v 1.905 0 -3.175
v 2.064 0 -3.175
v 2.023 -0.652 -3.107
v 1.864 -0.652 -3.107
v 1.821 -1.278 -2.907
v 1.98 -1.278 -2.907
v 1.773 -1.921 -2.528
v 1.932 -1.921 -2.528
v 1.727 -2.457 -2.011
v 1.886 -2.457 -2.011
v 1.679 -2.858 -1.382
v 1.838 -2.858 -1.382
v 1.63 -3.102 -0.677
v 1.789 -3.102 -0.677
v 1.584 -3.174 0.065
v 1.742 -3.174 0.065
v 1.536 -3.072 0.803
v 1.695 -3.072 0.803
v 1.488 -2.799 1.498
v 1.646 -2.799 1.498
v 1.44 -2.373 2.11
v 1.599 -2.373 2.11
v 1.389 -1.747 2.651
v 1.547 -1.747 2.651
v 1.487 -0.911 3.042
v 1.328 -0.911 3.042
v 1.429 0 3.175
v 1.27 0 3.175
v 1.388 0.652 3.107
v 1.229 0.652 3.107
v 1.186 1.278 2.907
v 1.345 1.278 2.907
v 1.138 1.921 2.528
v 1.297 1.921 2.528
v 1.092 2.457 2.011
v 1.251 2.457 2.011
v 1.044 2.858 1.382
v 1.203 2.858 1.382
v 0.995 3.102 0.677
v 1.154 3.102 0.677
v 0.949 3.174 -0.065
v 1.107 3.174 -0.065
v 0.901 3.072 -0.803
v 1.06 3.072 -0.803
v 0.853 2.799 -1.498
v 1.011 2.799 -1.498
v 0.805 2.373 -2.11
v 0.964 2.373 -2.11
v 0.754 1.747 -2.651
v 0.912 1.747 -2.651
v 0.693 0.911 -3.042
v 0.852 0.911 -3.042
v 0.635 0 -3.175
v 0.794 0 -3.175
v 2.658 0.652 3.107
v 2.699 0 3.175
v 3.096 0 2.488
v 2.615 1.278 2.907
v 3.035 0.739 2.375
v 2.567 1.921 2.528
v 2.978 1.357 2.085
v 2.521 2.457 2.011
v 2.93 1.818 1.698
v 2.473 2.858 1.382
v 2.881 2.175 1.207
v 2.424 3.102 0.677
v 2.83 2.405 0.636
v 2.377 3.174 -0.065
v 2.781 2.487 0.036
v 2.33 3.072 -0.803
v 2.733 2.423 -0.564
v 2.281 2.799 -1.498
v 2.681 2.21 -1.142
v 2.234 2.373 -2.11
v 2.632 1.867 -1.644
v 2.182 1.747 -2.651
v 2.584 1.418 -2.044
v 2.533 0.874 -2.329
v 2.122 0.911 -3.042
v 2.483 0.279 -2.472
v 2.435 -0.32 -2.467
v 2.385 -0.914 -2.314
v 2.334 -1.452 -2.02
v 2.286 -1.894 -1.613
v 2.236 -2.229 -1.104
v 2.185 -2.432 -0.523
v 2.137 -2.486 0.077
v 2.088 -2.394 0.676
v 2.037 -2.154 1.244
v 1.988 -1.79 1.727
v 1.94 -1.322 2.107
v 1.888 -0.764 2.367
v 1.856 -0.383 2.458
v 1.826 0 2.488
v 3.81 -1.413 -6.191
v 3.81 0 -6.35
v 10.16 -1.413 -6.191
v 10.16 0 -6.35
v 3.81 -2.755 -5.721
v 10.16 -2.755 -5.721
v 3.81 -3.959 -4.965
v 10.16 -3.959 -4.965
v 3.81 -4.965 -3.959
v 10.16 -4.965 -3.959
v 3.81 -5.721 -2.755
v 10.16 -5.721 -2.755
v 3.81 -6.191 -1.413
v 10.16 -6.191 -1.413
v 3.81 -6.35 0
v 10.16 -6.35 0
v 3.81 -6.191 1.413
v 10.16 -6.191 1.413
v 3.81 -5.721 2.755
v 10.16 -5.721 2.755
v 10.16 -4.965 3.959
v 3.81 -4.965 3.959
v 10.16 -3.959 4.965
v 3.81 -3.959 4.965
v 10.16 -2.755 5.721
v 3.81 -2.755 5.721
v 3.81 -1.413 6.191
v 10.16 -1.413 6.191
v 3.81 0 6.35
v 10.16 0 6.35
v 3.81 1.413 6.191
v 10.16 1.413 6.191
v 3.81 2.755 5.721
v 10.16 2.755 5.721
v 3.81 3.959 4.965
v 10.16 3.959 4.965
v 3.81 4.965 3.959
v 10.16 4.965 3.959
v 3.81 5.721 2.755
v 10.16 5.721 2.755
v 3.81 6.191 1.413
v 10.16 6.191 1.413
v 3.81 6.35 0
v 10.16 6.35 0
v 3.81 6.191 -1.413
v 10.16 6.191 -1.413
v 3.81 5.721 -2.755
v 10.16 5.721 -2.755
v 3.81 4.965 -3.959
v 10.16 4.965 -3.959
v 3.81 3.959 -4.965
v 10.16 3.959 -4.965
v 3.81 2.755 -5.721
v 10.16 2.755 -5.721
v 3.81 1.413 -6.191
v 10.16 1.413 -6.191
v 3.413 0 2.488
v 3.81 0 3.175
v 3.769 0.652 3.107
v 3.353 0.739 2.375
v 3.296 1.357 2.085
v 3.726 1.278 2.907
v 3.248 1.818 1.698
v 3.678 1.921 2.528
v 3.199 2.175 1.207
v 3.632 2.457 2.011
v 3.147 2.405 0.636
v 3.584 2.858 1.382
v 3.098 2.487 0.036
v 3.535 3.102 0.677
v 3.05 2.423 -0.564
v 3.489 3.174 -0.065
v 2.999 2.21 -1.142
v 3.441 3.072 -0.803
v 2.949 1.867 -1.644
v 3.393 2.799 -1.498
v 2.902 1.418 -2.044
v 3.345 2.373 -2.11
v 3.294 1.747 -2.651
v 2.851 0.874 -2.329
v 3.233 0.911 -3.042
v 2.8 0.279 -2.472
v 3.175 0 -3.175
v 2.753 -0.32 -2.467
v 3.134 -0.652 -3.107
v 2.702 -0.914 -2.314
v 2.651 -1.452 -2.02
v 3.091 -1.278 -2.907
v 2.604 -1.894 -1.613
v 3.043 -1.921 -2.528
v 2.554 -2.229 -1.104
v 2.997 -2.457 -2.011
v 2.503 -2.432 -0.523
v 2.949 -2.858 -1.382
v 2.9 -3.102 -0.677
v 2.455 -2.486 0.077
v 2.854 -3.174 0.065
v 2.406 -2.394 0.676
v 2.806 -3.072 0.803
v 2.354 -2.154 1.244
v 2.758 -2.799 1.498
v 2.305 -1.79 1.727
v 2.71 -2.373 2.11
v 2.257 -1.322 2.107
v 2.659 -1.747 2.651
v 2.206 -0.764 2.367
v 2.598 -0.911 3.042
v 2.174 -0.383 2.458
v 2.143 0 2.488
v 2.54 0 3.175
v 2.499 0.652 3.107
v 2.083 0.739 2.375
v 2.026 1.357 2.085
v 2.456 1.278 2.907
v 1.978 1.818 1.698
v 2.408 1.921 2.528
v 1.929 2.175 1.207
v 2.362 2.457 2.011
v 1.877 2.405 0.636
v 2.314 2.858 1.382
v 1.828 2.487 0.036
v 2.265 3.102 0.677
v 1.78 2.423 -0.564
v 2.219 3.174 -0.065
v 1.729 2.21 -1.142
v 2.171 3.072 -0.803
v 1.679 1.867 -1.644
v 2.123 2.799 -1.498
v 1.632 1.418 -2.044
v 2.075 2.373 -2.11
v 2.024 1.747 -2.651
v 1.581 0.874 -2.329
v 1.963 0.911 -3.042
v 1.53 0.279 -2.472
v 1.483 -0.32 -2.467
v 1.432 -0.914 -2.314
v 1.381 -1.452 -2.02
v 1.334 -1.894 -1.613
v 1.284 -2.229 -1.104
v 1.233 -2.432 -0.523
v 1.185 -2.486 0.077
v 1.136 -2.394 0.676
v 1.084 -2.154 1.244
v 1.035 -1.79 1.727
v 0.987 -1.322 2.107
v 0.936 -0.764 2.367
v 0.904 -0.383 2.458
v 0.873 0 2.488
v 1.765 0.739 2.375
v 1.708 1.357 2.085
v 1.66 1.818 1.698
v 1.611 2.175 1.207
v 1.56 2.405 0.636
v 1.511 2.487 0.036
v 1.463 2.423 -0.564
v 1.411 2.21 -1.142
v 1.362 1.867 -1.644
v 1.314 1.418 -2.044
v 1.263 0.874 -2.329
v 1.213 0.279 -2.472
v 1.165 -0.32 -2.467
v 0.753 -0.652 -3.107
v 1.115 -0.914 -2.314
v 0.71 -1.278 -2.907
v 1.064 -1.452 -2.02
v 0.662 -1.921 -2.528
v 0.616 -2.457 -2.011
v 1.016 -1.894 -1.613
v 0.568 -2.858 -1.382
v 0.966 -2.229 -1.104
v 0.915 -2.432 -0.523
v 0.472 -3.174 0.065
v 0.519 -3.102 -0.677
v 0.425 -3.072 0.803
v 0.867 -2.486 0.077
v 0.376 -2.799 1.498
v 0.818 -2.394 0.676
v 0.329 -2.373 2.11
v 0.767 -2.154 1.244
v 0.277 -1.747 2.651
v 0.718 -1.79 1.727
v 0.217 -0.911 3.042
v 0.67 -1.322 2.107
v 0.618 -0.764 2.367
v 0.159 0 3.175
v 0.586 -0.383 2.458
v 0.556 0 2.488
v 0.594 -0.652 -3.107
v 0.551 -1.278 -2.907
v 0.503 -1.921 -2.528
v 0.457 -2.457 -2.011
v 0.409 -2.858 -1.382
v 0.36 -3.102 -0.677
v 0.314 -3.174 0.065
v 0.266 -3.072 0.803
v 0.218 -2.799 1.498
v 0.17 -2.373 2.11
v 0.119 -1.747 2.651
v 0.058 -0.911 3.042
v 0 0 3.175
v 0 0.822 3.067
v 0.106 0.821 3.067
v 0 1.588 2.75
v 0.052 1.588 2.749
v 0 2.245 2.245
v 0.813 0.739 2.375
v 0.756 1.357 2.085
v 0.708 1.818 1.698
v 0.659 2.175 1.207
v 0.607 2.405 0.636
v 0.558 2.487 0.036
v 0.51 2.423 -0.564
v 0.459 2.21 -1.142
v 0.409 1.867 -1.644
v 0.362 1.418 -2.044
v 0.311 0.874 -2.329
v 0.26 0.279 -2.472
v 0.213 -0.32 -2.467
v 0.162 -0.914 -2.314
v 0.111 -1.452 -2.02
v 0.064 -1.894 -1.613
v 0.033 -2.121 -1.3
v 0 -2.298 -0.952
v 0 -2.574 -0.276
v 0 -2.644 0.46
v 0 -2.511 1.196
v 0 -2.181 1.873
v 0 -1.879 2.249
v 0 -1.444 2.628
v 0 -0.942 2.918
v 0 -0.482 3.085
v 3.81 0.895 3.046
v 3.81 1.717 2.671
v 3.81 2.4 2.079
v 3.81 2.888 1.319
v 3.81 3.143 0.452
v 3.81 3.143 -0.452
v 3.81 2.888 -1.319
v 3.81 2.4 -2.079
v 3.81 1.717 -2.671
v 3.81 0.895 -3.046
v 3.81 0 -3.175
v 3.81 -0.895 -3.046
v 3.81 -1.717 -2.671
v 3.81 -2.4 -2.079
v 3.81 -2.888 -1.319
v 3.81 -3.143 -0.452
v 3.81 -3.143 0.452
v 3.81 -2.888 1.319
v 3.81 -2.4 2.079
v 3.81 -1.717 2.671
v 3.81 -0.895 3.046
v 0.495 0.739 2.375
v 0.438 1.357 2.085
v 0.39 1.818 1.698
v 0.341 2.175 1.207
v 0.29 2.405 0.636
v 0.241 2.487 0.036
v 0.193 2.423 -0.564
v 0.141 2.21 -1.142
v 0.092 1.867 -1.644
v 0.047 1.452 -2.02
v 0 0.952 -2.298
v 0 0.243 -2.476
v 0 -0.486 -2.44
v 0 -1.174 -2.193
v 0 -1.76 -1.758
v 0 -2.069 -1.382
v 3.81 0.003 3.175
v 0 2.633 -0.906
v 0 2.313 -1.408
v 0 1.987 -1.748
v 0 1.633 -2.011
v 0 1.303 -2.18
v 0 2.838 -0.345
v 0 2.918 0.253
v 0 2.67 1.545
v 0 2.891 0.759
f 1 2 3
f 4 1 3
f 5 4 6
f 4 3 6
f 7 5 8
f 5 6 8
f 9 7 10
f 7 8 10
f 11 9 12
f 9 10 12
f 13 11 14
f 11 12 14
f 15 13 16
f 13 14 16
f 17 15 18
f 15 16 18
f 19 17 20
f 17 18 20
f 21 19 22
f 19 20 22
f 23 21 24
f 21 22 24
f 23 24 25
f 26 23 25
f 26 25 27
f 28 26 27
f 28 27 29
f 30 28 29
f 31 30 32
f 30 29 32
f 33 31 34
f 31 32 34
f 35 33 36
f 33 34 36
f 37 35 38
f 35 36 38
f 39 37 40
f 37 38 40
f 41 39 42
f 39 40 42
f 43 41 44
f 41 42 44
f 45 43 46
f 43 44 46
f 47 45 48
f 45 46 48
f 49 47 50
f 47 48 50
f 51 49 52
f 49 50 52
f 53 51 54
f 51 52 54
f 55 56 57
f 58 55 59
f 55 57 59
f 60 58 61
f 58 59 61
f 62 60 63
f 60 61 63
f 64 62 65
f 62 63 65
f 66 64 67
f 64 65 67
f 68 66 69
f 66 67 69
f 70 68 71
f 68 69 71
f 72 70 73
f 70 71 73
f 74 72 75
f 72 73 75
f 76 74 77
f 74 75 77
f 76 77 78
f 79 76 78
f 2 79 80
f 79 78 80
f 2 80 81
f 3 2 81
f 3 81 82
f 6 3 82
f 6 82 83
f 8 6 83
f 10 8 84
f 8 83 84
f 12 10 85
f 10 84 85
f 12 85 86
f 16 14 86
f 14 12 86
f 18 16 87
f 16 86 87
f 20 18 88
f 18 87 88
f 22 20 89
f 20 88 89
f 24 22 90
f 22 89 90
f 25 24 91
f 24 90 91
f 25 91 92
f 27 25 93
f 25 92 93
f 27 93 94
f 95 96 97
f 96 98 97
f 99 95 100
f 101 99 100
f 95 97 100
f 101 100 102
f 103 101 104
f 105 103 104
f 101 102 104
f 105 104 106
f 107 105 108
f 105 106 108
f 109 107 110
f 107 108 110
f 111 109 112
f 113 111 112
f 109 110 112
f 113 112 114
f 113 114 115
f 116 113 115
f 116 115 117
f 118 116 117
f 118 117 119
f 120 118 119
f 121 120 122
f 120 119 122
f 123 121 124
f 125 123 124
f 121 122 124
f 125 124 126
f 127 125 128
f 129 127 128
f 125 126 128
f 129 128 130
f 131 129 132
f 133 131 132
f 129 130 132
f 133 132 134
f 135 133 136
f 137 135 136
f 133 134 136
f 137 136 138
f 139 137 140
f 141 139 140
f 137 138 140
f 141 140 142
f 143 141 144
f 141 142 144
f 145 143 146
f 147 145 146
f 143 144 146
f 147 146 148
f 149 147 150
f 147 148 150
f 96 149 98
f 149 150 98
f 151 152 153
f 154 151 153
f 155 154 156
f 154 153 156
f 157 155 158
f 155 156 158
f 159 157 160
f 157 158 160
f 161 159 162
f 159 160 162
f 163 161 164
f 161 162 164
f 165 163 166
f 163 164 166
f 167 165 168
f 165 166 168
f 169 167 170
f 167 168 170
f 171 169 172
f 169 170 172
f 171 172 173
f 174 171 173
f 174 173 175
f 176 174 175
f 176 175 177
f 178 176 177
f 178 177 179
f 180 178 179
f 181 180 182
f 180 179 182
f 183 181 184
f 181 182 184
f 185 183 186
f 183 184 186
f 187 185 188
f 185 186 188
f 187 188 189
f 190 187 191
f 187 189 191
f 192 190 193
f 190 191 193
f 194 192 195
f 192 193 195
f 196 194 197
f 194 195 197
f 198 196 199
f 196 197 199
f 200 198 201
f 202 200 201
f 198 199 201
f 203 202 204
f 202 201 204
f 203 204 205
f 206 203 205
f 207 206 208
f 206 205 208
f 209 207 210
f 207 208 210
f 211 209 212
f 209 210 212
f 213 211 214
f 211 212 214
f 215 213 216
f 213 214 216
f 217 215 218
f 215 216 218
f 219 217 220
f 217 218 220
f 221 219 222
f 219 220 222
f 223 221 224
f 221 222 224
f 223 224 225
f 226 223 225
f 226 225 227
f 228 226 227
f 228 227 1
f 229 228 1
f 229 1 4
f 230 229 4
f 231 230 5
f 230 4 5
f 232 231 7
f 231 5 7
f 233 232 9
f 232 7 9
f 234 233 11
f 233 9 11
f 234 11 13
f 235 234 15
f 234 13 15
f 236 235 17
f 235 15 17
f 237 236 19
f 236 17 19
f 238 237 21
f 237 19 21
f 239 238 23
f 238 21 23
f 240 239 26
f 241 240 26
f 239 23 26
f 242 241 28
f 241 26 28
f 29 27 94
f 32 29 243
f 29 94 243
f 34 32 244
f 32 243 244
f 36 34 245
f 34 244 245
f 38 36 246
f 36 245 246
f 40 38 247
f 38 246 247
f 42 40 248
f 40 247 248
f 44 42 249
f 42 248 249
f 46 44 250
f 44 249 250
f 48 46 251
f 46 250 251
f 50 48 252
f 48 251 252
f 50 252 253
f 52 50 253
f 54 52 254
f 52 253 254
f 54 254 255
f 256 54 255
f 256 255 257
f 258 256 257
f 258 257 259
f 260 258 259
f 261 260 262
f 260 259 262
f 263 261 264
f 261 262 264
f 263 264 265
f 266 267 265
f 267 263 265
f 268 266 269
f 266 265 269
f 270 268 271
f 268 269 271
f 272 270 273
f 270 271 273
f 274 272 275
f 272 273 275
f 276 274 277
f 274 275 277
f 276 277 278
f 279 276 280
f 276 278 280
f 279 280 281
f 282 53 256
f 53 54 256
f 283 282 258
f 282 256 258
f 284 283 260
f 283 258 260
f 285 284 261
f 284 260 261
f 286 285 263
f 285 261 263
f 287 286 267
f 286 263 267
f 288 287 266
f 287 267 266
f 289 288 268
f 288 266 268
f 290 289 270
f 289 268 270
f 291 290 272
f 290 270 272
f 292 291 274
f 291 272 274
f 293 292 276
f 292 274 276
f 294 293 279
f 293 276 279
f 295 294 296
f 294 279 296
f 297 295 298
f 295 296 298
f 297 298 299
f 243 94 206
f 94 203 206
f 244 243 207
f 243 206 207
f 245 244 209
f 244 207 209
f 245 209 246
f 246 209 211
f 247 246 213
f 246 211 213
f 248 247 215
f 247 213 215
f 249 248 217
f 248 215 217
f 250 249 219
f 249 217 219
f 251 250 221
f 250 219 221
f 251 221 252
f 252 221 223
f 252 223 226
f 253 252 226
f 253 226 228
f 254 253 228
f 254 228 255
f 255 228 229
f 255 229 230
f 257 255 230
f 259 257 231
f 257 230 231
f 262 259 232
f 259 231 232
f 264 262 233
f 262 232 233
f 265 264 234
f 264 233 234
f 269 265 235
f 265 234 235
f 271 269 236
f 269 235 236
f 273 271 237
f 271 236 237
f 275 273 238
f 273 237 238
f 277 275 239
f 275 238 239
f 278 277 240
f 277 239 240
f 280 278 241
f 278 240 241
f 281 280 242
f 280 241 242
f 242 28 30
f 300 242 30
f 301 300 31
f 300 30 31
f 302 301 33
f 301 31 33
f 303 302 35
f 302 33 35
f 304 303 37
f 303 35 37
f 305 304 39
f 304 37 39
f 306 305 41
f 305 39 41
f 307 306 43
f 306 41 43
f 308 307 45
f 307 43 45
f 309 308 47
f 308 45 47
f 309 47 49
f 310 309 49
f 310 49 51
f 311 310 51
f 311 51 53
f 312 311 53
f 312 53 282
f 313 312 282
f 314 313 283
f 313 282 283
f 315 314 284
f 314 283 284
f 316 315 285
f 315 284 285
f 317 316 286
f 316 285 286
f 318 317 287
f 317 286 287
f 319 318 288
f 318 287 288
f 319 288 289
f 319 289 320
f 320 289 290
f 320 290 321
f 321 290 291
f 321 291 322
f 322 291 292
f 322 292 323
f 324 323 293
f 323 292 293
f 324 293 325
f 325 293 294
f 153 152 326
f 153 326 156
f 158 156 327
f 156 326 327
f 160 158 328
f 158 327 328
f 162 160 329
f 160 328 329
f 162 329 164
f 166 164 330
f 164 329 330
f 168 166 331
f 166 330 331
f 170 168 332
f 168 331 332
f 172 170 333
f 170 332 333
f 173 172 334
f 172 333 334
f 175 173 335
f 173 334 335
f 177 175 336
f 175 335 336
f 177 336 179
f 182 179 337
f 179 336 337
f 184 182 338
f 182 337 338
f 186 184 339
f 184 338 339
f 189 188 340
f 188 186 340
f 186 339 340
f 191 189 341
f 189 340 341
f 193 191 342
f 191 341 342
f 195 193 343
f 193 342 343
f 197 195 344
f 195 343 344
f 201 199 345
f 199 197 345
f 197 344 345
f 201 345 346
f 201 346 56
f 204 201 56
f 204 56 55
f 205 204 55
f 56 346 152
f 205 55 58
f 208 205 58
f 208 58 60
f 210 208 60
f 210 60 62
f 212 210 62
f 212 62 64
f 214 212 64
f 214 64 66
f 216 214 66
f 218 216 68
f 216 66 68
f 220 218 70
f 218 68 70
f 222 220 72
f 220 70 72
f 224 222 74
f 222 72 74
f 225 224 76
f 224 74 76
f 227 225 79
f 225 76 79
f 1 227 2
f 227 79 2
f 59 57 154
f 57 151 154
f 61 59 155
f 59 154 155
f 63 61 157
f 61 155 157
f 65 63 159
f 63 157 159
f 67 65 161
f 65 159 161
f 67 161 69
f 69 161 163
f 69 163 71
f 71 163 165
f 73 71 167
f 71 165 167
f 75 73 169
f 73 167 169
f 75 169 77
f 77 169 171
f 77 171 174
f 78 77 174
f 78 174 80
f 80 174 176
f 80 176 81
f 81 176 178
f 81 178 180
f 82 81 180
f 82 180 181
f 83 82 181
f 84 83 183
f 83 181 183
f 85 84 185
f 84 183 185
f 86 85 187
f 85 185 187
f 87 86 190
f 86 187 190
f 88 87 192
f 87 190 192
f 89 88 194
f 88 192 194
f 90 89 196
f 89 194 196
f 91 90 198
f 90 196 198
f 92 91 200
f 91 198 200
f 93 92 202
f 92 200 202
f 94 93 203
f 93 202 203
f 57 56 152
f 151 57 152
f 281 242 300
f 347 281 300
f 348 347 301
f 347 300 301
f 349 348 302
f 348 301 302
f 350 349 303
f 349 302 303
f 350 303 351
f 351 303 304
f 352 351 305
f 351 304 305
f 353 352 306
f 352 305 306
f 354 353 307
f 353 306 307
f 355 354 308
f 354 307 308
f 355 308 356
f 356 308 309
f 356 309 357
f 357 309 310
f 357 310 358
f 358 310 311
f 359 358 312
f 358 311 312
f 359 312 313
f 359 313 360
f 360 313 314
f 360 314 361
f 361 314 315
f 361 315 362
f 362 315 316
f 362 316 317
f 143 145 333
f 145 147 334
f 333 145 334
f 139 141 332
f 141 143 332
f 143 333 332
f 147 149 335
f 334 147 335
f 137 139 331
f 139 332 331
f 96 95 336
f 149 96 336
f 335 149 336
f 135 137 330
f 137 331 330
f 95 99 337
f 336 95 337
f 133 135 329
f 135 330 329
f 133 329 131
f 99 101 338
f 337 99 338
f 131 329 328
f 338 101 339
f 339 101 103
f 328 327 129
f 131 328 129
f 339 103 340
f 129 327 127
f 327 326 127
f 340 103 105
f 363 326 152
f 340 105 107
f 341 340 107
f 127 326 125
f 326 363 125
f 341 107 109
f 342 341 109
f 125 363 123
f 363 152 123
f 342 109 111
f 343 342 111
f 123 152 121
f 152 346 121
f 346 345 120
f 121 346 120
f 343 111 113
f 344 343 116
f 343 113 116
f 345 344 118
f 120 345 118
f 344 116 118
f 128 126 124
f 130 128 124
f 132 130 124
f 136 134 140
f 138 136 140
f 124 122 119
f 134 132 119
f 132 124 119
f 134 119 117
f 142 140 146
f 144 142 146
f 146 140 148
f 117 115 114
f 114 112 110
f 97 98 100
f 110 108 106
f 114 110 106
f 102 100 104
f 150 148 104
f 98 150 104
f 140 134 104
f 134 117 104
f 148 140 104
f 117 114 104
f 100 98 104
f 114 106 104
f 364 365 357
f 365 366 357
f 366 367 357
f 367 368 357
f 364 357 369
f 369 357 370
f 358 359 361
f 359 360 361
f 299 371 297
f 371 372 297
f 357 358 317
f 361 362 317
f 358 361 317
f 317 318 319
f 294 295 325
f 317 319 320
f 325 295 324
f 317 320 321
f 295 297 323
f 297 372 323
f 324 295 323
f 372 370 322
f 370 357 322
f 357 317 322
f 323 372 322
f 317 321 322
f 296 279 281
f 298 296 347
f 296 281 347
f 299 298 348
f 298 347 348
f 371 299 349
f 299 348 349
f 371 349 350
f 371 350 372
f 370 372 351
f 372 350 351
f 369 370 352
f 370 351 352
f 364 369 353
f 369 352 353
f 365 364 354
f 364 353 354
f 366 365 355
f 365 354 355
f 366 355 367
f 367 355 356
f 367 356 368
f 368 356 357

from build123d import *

# Parameters (mm, degrees)
THREAD1_PITCH = 1.27


with BuildPart() as part:
    # Sketch1 → Revolve1 (revolve)
    with BuildSketch(Plane.XY, mode=Mode.PRIVATE) as revolve1_sk:
        Polygon((0, 0), (0, 3.175), (3.81, 3.175), (3.81, 6.35), (10.16, 6.35), (10.16, 0), align=None)
    revolve(revolve1_sk.sketch.rotate(Axis((10.16, 0, 0), (-1, 0, 0)), 90), axis=Axis((10.16, 0, 0), (-1, 0, 0)))

    # Thread1: the profile of Thread Profile1 profile screwed along a right-hand helix of 3 turns, 8 arcs to a turn; built about Z, then put on its axis
    thread1_z = Axis((0, 0, 0), (0, 0, 1))
    thread1_corners = [(3.1753, 0, -0.000173205), (3.1753, 0, 1.111423202), (2.487592339, 0, 0.714374998), (2.487592339, 0, 0.396874998)]
    with BuildLine(mode=Mode.PRIVATE) as thread1_profile:
        Line(thread1_corners[0], thread1_corners[1])
        Line(thread1_corners[1], thread1_corners[2])
        Line(thread1_corners[2], thread1_corners[3])
        Line(thread1_corners[3], thread1_corners[0])
    thread1_cap = Face(thread1_profile.wire())
    thread1_turn_angles = [0, 22.5, 45, 67.5, 90, 112.5, 135, 157.5, 180, 202.5, 225, 247.5, 270, 292.5, 315, 337.5, 360]
    thread1_turn_weights = [1, 0.9238795325112867, 1, 0.9238795325112867, 1, 0.9238795325112867, 1, 0.9238795325112867, 1, 0.9238795325112867, 1, 0.9238795325112867, 1, 0.9238795325112867, 1, 0.9238795325112867, 1]
    thread1_turn_rails = [Edge.make_bspline([Vector(p[0], p[1], 0).rotate(thread1_z, thread1_turn_angles[k]) / thread1_turn_weights[k] + Vector(0, 0, p[2] + THREAD1_PITCH * thread1_turn_angles[k] / 360) for k in range(17)], [0, 0, 0, 1, 1, 2, 2, 3, 3, 4, 4, 5, 5, 6, 6, 7, 7, 8, 8, 8], 2, thread1_turn_weights) for p in thread1_corners]
    thread1_turn_sides = [Face.make_surface_from_curves(thread1_turn_rails[p[0]], thread1_turn_rails[p[1]]) for p in [(0, 1), (1, 2), (2, 3), (3, 0)]]
    thread1 = Plane(origin=(3.81, 0, 0), x_dir=(0, 0, 1), z_dir=(-1, 0, 0)) * Solid(Shell([*[p.moved(Location((0, 0, THREAD1_PITCH * i))) for i in range(3) for p in thread1_turn_sides], thread1_cap, thread1_cap.rotate(thread1_z, 1080).moved(Location((0, 0, THREAD1_PITCH * 1080 / 360)))]))
    add(thread1, mode=Mode.SUBTRACT)


solid = part.part
